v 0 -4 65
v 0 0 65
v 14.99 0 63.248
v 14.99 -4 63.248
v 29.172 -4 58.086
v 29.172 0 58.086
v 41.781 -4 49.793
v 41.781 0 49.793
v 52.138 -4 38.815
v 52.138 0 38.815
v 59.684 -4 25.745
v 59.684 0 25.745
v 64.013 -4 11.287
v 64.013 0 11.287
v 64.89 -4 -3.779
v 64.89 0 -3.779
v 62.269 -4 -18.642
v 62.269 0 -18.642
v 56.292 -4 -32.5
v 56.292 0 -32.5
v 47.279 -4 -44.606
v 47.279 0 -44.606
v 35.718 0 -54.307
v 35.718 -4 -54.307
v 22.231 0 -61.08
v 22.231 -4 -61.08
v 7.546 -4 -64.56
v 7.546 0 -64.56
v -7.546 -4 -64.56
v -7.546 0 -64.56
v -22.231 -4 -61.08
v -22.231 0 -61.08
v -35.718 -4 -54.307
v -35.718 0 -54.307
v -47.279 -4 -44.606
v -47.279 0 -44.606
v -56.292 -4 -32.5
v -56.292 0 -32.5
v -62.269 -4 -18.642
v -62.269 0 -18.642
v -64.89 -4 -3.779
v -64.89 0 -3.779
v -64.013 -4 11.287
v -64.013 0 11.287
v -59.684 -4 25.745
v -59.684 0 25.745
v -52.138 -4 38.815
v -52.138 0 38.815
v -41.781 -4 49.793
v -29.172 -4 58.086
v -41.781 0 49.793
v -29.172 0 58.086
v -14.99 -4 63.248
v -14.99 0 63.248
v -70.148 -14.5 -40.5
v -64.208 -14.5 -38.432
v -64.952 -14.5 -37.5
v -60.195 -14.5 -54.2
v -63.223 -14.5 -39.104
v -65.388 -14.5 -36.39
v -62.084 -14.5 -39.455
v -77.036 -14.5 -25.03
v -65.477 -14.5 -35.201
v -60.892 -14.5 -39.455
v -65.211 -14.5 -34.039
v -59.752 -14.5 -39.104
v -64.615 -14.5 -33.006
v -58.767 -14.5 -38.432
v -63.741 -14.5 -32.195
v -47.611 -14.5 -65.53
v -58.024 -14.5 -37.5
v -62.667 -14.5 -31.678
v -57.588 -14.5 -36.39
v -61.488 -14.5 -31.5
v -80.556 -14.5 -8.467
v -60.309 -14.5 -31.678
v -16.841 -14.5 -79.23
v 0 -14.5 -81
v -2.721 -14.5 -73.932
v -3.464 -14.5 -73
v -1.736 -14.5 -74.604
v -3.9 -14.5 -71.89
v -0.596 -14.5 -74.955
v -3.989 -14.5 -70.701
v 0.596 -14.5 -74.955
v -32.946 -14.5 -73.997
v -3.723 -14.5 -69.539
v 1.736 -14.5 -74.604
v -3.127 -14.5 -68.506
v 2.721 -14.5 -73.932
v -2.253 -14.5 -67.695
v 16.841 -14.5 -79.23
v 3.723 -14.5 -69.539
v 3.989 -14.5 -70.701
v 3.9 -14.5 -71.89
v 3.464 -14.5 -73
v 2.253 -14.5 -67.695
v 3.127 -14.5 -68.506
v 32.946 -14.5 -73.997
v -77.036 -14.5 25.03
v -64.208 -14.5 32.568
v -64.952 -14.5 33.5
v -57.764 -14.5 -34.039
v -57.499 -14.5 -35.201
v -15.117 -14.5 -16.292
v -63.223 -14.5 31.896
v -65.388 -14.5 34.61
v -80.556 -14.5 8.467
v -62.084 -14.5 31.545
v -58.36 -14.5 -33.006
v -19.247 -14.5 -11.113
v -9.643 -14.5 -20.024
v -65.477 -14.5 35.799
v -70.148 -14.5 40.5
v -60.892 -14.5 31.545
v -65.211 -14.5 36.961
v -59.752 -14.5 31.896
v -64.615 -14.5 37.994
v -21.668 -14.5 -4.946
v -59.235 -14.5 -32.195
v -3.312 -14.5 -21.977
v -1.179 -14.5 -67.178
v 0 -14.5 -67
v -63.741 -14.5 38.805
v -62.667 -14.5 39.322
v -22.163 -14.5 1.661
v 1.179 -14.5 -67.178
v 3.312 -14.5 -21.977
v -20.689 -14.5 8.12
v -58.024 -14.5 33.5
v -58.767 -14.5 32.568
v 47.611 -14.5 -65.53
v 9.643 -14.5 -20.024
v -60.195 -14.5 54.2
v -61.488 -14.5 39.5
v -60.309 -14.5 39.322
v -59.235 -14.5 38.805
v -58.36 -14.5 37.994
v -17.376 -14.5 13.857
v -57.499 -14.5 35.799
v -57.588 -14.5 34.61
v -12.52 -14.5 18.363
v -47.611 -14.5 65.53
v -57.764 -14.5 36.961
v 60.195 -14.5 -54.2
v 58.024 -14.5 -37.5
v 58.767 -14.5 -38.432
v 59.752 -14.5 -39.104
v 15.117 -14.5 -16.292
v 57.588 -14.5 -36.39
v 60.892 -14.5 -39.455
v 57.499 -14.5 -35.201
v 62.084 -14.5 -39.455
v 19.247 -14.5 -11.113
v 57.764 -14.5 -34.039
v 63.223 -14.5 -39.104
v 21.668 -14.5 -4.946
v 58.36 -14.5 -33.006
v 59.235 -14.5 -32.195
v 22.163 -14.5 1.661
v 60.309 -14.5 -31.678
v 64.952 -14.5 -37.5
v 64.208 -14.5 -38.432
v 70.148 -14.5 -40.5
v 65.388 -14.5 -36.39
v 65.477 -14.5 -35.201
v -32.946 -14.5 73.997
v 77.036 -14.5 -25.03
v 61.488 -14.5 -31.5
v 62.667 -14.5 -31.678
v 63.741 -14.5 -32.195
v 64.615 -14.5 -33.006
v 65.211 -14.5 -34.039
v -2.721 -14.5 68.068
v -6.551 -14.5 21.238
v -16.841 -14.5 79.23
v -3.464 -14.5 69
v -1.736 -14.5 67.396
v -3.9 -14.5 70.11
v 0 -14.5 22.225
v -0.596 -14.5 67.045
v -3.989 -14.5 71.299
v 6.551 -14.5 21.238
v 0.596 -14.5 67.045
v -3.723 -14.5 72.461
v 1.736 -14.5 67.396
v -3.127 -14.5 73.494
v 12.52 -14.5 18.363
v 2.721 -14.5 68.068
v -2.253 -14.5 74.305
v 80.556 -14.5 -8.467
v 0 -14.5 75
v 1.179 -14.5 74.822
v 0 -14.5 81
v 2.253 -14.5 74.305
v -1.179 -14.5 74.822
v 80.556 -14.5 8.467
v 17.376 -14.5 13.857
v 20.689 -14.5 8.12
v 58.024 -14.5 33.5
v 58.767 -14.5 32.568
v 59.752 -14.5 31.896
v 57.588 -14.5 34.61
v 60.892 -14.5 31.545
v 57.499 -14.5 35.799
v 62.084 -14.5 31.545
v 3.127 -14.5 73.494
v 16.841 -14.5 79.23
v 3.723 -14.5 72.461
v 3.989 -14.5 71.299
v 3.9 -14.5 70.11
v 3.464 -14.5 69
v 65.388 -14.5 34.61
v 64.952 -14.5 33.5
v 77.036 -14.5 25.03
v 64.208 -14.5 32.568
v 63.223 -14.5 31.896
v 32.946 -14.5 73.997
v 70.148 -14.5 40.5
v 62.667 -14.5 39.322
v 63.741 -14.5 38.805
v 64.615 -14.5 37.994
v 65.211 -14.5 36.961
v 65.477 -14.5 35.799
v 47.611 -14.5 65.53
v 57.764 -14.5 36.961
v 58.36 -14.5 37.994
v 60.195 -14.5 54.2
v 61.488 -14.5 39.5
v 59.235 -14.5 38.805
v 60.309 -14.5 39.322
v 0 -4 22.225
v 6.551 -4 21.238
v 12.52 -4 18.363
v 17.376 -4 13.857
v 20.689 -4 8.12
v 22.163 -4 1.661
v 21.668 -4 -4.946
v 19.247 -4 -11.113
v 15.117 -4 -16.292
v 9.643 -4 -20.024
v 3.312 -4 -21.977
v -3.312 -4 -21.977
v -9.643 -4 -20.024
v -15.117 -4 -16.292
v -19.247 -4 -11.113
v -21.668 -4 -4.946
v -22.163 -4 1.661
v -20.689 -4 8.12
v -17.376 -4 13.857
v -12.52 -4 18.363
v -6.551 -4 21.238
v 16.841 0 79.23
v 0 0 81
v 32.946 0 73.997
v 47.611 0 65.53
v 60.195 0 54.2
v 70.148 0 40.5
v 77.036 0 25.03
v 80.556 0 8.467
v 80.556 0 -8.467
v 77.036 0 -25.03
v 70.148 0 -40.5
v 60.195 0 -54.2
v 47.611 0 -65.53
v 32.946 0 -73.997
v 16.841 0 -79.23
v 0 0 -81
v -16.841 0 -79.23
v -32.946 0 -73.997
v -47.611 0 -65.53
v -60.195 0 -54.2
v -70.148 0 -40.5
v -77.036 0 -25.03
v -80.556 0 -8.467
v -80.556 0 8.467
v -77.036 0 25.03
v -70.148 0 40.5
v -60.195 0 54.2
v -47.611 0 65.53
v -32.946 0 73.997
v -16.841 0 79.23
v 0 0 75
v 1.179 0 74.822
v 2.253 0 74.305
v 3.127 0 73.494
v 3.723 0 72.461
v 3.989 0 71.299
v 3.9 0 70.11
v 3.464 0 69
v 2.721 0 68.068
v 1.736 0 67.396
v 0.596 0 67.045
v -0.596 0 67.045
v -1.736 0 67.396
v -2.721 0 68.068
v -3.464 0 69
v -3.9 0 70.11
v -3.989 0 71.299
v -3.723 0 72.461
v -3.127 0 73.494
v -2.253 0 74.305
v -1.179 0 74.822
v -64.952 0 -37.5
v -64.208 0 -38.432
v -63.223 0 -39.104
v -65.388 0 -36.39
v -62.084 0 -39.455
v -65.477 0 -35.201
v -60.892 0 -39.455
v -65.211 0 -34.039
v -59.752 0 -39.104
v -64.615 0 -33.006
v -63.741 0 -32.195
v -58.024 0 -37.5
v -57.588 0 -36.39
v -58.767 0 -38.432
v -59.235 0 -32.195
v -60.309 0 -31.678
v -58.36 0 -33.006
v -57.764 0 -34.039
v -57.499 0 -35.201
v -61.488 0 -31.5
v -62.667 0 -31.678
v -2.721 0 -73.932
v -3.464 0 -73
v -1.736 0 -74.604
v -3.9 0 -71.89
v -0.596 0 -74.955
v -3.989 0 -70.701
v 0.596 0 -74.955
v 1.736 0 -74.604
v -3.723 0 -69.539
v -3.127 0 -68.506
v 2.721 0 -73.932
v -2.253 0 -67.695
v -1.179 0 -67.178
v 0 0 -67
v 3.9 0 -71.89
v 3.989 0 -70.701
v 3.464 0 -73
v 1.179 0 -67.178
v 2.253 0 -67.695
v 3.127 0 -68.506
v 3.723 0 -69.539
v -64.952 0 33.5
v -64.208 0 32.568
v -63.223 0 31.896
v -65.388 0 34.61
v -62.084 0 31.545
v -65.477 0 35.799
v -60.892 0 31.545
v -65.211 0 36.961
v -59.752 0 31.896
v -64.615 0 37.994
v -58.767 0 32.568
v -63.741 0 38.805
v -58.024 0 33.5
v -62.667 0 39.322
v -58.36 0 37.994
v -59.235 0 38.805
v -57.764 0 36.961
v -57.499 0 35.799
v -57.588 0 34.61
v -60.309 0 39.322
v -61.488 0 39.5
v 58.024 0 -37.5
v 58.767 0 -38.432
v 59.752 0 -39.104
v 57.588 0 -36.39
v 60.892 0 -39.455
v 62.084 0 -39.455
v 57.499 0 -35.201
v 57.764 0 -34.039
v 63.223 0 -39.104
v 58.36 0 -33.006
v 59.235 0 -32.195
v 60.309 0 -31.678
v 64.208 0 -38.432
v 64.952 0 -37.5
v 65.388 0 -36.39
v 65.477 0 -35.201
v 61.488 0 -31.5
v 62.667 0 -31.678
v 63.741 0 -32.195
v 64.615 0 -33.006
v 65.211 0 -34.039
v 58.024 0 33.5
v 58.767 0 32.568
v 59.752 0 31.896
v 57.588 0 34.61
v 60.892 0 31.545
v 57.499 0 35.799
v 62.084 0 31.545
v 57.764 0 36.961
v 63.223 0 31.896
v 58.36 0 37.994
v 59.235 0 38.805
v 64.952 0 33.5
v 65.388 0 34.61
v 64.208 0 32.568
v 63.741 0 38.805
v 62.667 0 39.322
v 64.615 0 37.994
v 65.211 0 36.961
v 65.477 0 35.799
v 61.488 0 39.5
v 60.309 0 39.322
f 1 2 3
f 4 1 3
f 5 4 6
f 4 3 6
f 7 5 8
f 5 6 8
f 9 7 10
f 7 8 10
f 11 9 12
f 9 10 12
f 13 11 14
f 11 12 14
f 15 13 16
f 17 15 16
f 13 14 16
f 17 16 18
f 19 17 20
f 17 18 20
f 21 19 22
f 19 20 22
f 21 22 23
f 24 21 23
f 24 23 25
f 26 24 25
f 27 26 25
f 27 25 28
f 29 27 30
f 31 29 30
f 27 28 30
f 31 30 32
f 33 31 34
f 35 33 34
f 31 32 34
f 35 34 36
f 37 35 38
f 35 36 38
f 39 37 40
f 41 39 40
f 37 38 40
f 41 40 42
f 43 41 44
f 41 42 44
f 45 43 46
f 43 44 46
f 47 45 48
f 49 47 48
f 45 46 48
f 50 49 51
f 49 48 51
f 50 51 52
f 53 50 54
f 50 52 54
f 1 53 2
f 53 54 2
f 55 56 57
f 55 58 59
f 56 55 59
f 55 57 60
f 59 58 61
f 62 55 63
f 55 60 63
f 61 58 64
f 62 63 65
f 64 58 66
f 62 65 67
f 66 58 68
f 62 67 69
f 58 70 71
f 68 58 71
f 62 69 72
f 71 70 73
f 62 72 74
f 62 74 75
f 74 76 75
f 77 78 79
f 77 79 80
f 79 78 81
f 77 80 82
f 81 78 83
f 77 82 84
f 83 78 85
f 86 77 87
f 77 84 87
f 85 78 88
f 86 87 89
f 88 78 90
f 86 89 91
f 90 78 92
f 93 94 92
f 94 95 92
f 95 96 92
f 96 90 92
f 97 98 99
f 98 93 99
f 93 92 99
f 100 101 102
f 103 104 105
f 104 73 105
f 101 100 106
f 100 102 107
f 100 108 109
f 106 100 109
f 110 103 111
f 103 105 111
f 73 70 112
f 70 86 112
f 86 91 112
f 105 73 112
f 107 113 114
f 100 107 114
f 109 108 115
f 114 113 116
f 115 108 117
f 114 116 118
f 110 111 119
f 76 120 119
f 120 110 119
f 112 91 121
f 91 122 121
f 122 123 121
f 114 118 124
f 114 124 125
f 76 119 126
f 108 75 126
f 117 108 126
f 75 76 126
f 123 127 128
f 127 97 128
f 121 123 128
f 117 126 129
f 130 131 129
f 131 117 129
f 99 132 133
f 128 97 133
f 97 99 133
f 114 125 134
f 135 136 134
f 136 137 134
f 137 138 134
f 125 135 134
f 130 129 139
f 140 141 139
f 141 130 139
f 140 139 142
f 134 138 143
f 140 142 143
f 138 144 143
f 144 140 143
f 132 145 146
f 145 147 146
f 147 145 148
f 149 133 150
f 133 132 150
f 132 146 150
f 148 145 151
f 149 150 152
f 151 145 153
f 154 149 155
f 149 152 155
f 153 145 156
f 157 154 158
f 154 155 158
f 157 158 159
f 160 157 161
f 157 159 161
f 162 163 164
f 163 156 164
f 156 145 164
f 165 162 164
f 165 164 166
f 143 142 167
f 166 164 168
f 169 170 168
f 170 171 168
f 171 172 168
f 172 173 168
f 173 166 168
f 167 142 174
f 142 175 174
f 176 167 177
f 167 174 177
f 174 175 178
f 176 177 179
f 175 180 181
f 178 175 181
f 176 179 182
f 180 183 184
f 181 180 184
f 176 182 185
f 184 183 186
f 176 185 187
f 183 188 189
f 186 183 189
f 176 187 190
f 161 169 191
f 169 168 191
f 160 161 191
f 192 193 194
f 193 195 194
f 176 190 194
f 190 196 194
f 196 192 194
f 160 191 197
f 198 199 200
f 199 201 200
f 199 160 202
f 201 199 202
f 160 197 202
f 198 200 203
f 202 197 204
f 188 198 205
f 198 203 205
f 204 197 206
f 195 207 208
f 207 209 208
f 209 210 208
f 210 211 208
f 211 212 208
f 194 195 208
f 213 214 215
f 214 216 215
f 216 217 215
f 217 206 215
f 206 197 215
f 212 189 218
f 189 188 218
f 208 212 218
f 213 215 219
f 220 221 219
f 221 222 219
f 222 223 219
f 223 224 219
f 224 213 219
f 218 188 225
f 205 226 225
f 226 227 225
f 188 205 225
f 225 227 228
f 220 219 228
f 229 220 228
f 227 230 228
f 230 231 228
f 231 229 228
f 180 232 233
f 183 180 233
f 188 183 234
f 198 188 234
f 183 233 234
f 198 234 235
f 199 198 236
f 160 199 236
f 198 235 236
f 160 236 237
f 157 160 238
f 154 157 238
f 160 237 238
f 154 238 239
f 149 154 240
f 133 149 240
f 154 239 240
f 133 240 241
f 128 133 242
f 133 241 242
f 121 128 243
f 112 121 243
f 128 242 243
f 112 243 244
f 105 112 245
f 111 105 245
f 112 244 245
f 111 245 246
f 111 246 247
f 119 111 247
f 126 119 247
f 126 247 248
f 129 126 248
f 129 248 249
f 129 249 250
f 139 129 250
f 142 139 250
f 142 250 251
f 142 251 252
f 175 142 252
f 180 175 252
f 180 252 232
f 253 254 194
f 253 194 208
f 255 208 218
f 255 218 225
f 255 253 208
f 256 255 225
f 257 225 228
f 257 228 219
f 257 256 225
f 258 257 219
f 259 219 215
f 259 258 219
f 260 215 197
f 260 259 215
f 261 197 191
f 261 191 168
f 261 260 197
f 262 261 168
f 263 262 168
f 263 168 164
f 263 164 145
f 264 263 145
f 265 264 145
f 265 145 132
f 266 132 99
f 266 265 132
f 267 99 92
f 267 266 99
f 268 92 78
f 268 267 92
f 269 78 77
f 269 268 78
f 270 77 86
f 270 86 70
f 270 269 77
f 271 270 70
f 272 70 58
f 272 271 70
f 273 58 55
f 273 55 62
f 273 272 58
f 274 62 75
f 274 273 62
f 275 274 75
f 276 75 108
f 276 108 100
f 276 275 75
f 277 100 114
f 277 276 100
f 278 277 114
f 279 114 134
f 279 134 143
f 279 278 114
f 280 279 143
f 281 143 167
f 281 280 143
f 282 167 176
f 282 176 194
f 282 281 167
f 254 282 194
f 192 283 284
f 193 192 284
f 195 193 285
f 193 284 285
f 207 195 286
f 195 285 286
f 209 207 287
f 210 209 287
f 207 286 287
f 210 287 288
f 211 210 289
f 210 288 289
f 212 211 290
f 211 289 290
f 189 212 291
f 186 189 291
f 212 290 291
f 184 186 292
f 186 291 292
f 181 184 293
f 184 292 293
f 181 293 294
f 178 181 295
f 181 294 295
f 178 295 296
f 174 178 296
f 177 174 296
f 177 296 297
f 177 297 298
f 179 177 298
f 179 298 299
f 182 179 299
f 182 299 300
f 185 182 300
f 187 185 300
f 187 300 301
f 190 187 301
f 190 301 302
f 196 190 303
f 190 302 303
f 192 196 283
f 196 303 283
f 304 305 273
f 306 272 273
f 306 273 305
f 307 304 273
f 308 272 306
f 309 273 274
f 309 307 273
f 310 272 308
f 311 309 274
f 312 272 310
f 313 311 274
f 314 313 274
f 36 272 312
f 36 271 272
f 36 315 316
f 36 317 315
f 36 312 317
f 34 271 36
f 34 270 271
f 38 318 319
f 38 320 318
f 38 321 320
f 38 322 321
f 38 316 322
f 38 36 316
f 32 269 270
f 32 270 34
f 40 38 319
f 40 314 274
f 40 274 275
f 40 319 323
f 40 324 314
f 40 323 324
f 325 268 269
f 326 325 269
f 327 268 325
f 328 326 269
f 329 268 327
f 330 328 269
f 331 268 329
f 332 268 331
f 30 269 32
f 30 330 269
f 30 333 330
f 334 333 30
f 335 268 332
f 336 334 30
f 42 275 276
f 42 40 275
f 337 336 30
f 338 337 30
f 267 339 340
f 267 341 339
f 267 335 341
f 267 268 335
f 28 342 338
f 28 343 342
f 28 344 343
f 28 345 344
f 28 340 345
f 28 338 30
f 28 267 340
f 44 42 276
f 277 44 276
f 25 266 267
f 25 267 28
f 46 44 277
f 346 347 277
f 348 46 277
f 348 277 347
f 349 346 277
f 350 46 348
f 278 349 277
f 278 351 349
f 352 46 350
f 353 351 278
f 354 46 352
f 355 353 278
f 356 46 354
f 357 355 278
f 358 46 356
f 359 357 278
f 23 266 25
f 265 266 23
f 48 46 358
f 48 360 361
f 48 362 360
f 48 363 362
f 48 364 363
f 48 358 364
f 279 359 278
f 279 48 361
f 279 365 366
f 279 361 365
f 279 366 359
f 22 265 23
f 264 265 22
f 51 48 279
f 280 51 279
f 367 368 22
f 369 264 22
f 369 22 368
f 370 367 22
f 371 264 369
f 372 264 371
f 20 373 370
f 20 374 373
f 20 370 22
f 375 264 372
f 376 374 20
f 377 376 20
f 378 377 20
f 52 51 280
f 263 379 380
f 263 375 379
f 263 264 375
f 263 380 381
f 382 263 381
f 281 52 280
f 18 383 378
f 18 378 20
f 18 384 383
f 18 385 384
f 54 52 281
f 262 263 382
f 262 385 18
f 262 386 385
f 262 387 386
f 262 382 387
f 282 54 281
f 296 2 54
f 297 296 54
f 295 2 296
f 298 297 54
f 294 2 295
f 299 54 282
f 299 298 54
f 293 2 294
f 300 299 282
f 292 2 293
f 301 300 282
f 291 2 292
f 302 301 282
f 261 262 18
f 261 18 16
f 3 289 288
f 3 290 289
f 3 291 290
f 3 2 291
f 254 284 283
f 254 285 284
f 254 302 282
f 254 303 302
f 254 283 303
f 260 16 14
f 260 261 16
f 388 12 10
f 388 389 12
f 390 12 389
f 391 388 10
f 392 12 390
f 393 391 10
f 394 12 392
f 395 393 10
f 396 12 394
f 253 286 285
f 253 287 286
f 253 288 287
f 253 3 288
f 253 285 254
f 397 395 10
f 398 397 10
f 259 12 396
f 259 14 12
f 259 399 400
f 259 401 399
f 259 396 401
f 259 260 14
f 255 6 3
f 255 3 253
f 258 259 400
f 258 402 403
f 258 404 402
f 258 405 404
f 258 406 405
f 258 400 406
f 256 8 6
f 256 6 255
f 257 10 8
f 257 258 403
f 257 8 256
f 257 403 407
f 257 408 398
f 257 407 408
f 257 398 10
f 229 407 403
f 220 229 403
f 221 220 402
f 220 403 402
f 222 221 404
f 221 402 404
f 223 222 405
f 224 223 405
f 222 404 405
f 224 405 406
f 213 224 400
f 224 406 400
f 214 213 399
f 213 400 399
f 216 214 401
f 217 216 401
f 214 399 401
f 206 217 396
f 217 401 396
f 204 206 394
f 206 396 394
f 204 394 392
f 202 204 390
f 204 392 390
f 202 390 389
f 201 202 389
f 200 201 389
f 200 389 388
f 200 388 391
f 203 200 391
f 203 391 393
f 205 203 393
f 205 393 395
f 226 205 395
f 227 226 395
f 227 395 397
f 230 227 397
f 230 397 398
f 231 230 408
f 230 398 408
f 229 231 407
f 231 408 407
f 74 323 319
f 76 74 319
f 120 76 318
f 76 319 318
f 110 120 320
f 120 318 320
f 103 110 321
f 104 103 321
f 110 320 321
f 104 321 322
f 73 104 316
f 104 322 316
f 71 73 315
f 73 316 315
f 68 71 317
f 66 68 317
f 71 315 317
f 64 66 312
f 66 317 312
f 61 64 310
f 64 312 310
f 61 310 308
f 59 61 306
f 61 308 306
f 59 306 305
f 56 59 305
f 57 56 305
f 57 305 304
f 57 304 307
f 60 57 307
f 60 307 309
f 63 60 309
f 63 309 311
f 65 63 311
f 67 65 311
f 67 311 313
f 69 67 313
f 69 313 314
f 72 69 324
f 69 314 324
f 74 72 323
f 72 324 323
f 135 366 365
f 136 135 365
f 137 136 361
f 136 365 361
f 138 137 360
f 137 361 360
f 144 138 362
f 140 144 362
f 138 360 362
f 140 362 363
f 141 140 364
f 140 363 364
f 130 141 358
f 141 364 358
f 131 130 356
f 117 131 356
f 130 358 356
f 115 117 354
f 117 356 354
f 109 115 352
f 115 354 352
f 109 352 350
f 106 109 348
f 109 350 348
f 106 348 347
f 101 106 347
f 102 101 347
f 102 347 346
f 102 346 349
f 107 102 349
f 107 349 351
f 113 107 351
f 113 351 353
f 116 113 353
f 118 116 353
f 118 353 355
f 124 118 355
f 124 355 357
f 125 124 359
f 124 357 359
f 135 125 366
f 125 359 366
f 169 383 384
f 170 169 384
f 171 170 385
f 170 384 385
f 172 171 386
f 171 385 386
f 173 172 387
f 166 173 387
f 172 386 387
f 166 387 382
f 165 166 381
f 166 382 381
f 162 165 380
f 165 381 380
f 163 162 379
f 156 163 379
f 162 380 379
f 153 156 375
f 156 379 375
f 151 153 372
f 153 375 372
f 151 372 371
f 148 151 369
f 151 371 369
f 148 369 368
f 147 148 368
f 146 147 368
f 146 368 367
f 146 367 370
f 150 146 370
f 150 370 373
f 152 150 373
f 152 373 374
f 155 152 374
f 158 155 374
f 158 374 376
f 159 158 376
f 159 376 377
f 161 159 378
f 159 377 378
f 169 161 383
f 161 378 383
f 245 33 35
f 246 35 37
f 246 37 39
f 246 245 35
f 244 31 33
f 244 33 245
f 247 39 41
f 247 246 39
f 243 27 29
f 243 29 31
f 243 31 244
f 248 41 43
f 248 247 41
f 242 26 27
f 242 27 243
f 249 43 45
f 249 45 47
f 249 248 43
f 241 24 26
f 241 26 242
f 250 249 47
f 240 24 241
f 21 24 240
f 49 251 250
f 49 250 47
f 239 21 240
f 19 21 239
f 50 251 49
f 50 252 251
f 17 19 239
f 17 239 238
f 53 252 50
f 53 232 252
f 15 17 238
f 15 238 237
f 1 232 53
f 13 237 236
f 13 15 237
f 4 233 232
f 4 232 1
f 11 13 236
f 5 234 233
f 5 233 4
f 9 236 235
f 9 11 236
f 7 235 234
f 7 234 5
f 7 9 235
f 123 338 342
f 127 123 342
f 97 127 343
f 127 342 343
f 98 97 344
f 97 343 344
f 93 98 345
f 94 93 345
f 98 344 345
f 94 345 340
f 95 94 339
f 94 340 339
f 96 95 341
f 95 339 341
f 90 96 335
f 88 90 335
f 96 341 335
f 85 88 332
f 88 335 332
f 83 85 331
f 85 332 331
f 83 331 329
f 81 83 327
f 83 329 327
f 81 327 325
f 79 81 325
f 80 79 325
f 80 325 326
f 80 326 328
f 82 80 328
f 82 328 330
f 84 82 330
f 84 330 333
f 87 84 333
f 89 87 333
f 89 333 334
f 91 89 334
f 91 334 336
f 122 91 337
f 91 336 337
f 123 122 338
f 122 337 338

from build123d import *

# Parameters (mm, degrees)
SKETCH1_R           = 81
SKETCH1_R_2         = 22.225
SKETCH1_R_3         = 4
BOSS_EXTRUDE1_DEPTH = 14.5
SKETCH2_R           = 65
CUT_EXTRUDE1_DEPTH  = 4


with BuildPart() as part:
    # Sketch1 → Boss-Extrude1 (new body)
    with BuildSketch(Plane(origin=(0, 0, 0), x_dir=(1, 0, 0), z_dir=(0, 1, 0))):
        with Locations(Location((0, 0, 0), (0, 0, 270))):
            Circle(SKETCH1_R)
        with Locations(Location((0, 0, 0), (0, 0, 270))):
            Circle(SKETCH1_R_2, mode=Mode.SUBTRACT)
        with Locations(Location((0, 71, 0), (0, 0, 270))):
            Circle(SKETCH1_R_3, mode=Mode.SUBTRACT)
        with Locations(Location((61.487803669, 35.5, 0), (0, 0, 270))):
            Circle(SKETCH1_R_3, mode=Mode.SUBTRACT)
        with Locations(Location((61.487803669, -35.5, 0), (0, 0, 270))):
            Circle(SKETCH1_R_3, mode=Mode.SUBTRACT)
        with Locations(Location((0, -71, 0), (0, 0, 270))):
            Circle(SKETCH1_R_3, mode=Mode.SUBTRACT)
        with Locations(Location((-61.487803669, -35.5, 0), (0, 0, 270))):
            Circle(SKETCH1_R_3, mode=Mode.SUBTRACT)
        with Locations(Location((-61.487803669, 35.5, 0), (0, 0, 270))):
            Circle(SKETCH1_R_3, mode=Mode.SUBTRACT)
    extrude(amount=-BOSS_EXTRUDE1_DEPTH)

    # Sketch2 → Cut-Extrude1 (cut)
    with BuildSketch(Plane(origin=(0, 0, 0), x_dir=(1, 0, 0), z_dir=(0, 1, 0))):
        with Locations(Location((0, 0, 0), (0, 0, 270))):
            Circle(SKETCH2_R)
    extrude(amount=-CUT_EXTRUDE1_DEPTH, mode=Mode.SUBTRACT)


solid = part.part
